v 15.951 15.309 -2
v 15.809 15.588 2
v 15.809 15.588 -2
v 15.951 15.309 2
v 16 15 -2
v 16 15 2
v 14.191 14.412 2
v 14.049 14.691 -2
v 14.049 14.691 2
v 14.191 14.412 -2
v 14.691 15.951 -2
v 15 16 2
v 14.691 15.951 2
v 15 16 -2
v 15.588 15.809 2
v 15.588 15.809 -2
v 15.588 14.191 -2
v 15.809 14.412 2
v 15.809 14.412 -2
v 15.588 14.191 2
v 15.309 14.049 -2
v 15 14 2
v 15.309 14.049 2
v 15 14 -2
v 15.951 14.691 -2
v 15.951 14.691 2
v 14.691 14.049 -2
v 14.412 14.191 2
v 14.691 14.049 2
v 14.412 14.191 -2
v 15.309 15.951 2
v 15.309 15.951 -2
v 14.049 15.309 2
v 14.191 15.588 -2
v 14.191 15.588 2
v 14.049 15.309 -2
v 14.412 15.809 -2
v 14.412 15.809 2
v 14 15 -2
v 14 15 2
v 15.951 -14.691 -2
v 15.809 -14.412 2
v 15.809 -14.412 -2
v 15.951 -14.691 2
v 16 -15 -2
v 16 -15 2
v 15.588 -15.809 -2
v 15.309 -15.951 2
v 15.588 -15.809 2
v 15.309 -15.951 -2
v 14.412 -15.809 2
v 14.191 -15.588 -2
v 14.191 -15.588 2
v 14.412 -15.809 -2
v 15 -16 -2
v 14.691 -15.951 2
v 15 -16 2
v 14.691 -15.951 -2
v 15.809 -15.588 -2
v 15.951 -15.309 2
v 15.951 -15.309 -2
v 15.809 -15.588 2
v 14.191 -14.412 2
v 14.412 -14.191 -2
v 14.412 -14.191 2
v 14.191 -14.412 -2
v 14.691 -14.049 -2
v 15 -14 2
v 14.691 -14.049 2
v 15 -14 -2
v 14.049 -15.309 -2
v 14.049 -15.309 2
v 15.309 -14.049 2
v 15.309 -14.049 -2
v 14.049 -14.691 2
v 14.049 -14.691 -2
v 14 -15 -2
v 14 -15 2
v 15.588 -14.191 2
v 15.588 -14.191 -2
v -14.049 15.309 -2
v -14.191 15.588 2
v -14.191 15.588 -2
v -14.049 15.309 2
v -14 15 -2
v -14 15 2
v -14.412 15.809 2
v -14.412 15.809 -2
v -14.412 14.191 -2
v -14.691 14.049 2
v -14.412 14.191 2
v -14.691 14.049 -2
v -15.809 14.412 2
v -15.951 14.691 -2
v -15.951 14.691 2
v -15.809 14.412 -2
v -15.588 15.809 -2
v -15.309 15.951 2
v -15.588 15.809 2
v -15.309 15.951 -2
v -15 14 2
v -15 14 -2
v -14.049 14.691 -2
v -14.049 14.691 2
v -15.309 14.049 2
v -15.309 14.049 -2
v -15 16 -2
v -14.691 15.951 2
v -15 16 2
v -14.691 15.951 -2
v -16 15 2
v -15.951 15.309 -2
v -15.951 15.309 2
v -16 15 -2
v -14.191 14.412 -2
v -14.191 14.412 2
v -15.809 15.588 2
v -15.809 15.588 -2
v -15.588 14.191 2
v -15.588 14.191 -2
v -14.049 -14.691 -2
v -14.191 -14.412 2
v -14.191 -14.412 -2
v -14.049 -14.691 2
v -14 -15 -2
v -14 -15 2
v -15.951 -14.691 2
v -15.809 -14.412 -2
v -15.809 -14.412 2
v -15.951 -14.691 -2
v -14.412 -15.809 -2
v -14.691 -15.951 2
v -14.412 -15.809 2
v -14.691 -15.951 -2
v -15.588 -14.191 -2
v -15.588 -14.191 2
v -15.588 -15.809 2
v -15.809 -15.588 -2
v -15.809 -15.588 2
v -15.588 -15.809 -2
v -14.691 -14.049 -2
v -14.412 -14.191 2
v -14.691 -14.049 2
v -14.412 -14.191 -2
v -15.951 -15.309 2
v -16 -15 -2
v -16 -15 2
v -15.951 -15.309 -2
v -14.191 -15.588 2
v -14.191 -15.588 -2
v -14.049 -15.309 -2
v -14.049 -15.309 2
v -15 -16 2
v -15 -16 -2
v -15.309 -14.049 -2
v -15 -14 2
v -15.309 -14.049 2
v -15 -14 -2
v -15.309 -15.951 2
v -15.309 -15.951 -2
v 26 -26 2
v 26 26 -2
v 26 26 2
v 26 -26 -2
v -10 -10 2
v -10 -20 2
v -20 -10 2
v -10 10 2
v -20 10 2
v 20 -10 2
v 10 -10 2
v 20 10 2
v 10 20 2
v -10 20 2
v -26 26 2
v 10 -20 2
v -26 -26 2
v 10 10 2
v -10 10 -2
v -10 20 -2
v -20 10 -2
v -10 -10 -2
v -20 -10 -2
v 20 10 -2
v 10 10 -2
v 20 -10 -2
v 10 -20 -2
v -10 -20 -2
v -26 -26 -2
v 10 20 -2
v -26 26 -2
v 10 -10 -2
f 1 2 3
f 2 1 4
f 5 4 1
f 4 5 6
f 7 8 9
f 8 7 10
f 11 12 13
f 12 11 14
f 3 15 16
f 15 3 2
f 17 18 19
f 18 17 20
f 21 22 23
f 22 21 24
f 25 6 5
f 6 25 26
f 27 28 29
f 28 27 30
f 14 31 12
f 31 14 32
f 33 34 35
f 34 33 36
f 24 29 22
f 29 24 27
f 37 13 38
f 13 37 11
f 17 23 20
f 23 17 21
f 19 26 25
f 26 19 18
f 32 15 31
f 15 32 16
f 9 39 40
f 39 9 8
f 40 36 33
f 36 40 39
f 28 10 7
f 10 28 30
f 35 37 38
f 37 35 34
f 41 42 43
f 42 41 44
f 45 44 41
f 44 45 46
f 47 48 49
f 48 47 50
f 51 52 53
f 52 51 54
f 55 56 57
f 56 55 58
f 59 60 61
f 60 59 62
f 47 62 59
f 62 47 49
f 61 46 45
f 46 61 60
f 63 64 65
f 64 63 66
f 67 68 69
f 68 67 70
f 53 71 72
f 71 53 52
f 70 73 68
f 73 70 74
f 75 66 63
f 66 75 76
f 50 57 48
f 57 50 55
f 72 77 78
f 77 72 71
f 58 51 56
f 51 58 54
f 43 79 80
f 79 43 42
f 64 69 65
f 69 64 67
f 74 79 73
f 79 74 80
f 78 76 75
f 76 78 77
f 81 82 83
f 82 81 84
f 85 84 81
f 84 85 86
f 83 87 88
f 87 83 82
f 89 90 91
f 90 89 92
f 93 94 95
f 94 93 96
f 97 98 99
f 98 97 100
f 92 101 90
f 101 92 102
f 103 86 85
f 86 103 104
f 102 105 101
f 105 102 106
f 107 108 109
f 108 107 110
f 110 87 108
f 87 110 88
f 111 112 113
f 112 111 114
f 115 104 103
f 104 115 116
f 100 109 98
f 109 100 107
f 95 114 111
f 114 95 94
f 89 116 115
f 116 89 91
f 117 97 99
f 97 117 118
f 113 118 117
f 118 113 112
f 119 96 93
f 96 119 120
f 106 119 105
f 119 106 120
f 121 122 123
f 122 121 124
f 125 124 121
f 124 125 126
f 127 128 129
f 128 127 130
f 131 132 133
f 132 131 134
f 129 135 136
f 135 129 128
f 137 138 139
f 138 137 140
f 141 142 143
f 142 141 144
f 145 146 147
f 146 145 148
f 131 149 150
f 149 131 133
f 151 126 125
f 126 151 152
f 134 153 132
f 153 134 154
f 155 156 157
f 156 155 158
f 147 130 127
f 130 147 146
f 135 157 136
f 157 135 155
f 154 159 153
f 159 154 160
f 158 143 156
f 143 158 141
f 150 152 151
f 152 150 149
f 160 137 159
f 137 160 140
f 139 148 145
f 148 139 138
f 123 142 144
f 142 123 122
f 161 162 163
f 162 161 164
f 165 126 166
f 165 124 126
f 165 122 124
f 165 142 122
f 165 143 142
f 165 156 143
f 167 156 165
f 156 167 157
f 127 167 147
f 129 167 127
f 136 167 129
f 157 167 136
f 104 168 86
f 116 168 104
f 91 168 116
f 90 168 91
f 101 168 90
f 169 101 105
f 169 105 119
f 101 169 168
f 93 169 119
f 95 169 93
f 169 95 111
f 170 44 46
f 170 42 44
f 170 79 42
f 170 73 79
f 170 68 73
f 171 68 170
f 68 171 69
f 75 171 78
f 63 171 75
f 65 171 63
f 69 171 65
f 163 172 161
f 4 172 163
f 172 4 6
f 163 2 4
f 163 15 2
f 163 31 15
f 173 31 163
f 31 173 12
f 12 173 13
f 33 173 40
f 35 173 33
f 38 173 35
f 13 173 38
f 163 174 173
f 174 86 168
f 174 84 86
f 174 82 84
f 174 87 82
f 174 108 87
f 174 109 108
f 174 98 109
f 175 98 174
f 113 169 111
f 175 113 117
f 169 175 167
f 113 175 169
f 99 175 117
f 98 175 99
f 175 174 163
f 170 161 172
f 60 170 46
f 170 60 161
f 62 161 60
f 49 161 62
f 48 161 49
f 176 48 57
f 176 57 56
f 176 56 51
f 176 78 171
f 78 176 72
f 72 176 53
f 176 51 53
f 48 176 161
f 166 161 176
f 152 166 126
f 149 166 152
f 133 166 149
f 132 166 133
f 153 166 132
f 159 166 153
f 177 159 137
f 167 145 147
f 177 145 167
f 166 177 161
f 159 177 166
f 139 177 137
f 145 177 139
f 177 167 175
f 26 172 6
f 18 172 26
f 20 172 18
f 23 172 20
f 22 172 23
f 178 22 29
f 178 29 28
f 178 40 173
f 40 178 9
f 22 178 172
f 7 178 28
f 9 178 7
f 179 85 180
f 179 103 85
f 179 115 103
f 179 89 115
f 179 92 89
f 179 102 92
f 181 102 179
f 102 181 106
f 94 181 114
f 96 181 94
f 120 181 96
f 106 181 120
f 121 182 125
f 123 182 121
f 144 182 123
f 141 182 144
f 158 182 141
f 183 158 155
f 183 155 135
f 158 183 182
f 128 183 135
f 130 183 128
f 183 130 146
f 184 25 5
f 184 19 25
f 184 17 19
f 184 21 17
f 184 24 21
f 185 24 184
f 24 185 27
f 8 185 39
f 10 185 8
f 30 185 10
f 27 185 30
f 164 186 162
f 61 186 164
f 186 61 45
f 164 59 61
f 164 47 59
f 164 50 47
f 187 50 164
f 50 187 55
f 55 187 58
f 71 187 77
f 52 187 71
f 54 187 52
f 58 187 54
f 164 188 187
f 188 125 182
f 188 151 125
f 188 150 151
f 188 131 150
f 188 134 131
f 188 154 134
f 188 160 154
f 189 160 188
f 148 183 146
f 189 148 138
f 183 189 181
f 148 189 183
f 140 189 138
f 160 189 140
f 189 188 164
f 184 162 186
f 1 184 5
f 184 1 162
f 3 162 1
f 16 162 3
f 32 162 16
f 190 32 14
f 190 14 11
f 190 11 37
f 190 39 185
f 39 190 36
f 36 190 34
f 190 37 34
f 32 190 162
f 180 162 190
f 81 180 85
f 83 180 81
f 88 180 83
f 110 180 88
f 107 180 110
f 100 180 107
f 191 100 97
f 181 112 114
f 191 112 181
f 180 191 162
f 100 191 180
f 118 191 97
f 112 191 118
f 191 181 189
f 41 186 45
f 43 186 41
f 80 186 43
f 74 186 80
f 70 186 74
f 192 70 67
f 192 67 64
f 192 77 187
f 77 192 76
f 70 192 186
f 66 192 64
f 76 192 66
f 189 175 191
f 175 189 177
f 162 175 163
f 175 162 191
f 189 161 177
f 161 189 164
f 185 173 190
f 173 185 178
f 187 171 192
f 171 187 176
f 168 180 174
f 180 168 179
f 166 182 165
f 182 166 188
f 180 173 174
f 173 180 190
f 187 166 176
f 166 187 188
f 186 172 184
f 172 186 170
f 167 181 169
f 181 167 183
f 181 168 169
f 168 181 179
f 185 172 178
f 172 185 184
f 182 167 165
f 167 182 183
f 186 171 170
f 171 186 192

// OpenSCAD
//-------------------------------------------------------------------------
//-- base.scad
//-------------------------------------------------------------------------
//--This file has been generated automatically according to your data.
//--For more info, visit: http://iearobotics.com/oomlwiki/
//--------------------------------------------------------------------------

difference() {
  cube(size=[52.000, 52.000, 4.000], center=true);
  union() {
    translate(v=[15.000, 15.000, 0.000]) {
      cylinder(h=4.100, r1=1.000, r2=1.000, $fn=20, center=true);
    } // End translate
    translate(v=[15.000, -15.000, 0.000]) {
      cylinder(h=4.100, r1=1.000, r2=1.000, $fn=20, center=true);
    } // End translate
    translate(v=[-15.000, 15.000, 0.000]) {
      cylinder(h=4.100, r1=1.000, r2=1.000, $fn=20, center=true);
    } // End translate
    translate(v=[-15.000, -15.000, 0.000]) {
      cylinder(h=4.100, r1=1.000, r2=1.000, $fn=20, center=true);
    } // End translate
  } // End union
  cube(size=[20.000, 40.000, 4.100], center=true);
  cube(size=[40.000, 20.000, 4.100], center=true);
} // End difference
